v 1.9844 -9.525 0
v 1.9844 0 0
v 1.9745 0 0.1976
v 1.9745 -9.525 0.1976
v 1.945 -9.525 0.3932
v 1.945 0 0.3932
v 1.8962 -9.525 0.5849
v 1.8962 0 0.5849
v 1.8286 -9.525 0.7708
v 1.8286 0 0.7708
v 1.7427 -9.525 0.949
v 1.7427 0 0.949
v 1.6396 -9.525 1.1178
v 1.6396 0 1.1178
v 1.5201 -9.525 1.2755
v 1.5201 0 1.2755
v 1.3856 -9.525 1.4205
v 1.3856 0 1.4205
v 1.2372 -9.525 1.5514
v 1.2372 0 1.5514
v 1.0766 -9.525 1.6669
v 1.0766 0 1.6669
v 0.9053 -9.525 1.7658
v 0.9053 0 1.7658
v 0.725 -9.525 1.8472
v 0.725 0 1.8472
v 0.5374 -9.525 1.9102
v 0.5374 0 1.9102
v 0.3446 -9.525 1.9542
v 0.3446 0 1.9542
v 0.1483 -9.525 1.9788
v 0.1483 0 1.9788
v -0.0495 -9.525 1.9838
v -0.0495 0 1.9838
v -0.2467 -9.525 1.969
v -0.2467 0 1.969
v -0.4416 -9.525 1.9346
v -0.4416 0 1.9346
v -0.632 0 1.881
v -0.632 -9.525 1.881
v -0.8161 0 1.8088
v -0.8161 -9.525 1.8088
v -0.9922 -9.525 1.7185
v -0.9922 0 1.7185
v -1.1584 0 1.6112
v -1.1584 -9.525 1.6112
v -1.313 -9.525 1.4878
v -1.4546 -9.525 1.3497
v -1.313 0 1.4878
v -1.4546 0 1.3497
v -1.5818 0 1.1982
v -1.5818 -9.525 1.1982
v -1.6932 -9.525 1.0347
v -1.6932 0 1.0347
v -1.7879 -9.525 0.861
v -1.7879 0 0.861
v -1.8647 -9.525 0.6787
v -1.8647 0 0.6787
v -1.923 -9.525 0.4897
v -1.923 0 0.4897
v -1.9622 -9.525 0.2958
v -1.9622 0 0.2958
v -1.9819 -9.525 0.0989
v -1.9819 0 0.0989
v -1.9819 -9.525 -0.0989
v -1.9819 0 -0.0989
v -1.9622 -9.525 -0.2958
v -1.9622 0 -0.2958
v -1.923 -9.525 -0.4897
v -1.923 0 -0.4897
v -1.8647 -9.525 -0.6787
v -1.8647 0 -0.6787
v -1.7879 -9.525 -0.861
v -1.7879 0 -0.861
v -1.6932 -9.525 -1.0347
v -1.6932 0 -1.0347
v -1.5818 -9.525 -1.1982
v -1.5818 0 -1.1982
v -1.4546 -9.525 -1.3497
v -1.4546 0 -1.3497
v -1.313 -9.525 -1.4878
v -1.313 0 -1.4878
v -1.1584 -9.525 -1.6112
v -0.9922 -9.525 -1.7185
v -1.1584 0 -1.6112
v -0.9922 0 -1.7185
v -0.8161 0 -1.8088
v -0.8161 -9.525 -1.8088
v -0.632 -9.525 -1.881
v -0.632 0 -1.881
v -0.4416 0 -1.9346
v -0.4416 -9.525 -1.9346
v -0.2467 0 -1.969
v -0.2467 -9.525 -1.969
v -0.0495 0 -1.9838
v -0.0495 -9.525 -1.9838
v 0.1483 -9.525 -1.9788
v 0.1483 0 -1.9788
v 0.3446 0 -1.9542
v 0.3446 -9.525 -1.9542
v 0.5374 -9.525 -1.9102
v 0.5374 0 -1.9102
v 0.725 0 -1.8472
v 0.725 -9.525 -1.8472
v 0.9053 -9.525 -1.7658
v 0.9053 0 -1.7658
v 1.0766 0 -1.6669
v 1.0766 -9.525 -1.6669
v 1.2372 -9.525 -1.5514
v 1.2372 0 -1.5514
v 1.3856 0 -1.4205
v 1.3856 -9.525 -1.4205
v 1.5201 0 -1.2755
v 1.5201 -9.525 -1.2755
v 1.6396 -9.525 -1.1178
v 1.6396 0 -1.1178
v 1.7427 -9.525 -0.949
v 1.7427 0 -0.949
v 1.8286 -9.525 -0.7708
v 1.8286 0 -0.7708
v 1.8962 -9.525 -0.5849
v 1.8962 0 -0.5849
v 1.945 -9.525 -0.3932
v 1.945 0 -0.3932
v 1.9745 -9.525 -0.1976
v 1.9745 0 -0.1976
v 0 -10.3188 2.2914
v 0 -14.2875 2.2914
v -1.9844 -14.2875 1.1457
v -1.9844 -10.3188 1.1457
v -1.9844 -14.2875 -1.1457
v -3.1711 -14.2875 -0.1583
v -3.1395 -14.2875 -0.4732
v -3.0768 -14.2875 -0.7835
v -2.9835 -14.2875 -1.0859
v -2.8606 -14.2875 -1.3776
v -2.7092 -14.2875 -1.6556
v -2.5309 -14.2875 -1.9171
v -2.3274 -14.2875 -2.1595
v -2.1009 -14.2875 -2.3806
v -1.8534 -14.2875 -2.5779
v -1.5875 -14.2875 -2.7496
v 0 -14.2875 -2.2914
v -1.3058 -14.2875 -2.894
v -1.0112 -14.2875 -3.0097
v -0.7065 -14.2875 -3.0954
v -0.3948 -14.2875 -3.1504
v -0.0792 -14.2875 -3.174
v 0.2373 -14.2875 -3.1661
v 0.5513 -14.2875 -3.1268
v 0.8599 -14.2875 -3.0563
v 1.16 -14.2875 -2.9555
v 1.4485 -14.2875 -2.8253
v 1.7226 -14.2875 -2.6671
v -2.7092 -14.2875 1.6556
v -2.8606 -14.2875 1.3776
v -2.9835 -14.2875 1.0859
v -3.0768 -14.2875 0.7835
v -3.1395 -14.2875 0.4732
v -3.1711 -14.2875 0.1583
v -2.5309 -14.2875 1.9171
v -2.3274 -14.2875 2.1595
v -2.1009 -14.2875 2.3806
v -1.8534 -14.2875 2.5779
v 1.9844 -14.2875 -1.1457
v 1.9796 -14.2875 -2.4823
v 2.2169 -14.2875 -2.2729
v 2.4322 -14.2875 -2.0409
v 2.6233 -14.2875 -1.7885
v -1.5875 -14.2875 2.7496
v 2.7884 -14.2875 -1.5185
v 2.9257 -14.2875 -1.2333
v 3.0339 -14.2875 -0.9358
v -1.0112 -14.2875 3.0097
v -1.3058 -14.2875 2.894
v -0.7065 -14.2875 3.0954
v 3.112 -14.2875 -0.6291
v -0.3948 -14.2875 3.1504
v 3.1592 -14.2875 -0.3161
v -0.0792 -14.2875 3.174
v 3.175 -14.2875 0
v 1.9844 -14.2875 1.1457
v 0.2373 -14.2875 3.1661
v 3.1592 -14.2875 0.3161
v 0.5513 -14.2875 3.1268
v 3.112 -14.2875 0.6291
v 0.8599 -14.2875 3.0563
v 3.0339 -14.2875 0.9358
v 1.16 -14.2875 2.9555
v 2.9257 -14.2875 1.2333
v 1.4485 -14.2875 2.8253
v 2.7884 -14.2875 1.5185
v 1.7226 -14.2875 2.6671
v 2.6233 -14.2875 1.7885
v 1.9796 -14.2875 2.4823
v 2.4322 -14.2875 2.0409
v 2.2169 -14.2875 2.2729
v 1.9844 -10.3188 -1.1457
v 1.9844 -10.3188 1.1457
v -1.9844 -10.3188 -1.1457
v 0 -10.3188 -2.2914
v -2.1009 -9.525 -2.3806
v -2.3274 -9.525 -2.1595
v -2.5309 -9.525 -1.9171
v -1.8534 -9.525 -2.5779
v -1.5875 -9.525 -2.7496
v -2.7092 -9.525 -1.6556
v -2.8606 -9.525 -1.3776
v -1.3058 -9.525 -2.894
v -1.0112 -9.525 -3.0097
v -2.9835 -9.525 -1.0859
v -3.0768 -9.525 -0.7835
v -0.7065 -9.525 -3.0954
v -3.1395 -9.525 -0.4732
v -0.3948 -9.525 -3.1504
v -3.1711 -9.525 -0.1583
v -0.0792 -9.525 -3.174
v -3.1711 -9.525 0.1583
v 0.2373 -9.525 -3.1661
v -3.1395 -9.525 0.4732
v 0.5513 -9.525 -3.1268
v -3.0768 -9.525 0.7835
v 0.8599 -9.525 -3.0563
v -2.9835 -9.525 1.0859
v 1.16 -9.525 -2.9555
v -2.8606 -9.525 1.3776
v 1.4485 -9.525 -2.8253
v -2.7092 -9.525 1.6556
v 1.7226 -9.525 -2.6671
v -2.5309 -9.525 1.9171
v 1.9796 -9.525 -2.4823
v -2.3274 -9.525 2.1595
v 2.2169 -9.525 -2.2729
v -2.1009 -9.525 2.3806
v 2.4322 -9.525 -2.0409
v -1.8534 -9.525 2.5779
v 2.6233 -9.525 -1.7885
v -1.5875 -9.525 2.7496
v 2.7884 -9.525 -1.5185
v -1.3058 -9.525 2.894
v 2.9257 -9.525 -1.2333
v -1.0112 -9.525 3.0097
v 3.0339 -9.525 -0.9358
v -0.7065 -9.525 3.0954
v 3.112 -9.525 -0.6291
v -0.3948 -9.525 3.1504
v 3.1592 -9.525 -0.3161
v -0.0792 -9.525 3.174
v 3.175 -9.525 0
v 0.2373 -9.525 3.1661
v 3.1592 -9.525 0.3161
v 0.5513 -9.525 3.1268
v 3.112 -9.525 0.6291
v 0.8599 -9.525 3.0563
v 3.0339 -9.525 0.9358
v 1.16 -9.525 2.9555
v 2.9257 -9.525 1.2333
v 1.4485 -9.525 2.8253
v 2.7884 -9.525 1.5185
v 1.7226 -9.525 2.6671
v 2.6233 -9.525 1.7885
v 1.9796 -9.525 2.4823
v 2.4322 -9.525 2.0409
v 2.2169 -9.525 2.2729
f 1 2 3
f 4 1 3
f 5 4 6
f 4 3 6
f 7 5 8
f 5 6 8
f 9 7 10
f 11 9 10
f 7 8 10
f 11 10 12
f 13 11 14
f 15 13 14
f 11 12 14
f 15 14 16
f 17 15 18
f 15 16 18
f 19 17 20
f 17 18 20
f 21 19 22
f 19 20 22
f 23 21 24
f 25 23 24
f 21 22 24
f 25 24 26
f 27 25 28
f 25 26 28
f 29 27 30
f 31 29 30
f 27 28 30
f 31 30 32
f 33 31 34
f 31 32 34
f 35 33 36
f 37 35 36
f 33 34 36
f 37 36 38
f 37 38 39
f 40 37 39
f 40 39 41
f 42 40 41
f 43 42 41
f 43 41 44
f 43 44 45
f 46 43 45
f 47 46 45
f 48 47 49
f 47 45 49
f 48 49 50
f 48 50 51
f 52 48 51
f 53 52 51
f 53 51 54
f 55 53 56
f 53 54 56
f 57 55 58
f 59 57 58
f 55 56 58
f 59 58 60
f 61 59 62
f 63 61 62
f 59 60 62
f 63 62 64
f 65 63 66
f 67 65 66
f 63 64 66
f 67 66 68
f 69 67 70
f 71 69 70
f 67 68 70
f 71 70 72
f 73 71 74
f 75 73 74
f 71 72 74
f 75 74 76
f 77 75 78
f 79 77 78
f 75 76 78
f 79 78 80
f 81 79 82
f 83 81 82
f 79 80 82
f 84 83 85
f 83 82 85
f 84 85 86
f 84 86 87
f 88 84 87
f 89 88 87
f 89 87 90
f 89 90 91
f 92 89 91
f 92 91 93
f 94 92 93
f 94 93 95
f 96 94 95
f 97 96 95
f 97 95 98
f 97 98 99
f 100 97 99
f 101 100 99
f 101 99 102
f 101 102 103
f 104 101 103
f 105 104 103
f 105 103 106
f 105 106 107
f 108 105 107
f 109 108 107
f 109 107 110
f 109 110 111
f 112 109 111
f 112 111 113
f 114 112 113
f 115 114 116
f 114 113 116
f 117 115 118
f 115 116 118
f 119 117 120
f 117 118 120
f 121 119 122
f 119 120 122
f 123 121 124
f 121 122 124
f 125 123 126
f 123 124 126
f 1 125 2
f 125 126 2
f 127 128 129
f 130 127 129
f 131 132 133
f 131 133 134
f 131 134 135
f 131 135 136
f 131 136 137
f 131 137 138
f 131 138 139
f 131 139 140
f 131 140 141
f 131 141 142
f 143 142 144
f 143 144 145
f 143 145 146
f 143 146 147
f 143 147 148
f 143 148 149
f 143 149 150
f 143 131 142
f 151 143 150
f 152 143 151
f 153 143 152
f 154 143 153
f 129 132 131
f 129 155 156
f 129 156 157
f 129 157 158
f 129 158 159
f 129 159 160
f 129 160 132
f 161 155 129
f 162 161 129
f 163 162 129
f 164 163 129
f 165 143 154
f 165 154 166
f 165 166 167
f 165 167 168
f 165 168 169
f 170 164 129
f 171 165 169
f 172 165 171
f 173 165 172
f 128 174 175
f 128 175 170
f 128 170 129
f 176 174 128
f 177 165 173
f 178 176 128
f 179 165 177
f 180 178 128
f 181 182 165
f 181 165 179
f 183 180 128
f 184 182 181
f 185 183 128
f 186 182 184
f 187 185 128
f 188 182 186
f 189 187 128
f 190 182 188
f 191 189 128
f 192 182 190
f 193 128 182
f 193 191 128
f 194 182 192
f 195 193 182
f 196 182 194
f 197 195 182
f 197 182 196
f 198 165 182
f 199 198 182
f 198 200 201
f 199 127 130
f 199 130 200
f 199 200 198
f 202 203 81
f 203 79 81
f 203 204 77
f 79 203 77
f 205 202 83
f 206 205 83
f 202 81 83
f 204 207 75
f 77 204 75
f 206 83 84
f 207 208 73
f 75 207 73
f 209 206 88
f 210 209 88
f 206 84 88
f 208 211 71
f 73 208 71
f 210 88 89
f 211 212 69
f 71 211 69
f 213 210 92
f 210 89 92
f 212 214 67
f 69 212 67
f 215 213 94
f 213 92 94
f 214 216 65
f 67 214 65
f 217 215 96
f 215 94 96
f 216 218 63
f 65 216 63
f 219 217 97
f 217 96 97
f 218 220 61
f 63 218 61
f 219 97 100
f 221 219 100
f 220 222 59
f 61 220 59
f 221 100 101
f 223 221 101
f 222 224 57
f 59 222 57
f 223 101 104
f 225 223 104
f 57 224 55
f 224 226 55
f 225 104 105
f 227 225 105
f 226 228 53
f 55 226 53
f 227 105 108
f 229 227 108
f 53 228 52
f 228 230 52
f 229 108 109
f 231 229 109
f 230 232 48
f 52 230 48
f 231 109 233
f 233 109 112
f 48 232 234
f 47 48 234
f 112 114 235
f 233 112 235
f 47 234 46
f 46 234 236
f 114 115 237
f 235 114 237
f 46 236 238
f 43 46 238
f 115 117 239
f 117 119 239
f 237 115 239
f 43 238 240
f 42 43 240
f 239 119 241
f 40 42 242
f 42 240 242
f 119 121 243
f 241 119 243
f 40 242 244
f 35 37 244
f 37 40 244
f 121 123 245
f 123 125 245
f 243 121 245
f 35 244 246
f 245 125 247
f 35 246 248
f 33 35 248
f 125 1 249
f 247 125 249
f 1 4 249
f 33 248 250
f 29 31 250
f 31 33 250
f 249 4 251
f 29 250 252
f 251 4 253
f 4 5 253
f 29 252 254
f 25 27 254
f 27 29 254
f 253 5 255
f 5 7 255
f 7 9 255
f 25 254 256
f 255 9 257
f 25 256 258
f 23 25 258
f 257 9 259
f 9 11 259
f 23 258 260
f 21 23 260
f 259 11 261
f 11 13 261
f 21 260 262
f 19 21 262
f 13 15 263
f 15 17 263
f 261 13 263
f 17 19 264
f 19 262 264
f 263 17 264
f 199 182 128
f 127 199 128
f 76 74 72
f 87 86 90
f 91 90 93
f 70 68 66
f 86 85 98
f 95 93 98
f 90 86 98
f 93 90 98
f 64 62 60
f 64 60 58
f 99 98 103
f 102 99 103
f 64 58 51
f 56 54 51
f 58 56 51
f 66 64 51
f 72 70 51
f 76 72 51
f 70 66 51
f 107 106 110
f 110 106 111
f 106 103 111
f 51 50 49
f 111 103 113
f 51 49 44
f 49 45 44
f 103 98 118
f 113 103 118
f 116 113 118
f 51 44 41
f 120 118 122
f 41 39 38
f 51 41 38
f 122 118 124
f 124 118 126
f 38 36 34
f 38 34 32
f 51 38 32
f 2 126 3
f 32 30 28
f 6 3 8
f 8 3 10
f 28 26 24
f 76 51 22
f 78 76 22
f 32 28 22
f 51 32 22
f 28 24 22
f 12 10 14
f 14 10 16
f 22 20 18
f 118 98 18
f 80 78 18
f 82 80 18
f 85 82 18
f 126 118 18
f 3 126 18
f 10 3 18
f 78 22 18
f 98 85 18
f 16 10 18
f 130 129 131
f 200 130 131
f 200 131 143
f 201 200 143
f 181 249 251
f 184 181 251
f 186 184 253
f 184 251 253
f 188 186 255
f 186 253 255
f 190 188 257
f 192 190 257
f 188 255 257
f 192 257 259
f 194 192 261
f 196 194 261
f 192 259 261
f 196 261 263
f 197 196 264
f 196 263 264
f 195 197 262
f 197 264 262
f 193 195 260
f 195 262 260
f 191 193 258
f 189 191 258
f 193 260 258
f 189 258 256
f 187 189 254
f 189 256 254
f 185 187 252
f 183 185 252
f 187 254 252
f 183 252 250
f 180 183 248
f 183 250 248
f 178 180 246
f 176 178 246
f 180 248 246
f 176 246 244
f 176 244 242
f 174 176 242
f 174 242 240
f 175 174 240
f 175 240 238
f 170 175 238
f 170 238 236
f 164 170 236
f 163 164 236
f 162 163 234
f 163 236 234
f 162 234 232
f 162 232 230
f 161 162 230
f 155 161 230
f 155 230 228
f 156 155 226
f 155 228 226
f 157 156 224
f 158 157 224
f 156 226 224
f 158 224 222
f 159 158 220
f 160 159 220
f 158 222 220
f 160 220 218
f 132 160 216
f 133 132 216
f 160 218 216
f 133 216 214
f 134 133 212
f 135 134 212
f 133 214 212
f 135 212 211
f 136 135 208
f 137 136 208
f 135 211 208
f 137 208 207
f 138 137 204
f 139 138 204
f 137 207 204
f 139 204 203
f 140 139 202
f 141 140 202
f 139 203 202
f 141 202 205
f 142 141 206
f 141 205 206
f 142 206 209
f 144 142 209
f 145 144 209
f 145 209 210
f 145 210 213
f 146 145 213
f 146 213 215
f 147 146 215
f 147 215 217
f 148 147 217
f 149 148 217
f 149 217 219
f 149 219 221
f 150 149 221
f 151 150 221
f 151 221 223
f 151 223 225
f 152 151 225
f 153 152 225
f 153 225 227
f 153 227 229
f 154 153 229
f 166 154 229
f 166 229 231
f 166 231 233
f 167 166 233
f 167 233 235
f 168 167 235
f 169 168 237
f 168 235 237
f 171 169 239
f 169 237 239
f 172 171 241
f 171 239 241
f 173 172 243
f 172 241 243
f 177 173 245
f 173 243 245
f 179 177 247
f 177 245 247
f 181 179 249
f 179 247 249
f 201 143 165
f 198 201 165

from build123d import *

# Parameters (mm, degrees)
F0_R     = 1.984375
F1_DEPTH = 9.525
F3_R     = 3.175
F4_DEPTH = 4.7625
F6_DEPTH = 3.96875


with BuildPart() as f1:
    # F0 (on Front) → F1 (new body)
    with BuildSketch(Plane.XZ):
        Circle(F0_R)
    extrude(amount=F1_DEPTH)

    # F3 (on face) → F4 (join)
    with BuildSketch(Plane.XZ.offset(9.525)):
        Circle(F3_R)
    extrude(amount=F4_DEPTH)

    # F5 (on face) → F6 (cut)
    with BuildSketch(Plane.XZ.offset(14.2875)):
        Polygon((1.984375, 1.145679), (0, 2.291359), (-1.984375, 1.145679), (-1.984375, -1.145679), (0, -2.291359), (1.984375, -1.145679), align=None)
    extrude(amount=-F6_DEPTH, mode=Mode.SUBTRACT)


solid = f1.part
